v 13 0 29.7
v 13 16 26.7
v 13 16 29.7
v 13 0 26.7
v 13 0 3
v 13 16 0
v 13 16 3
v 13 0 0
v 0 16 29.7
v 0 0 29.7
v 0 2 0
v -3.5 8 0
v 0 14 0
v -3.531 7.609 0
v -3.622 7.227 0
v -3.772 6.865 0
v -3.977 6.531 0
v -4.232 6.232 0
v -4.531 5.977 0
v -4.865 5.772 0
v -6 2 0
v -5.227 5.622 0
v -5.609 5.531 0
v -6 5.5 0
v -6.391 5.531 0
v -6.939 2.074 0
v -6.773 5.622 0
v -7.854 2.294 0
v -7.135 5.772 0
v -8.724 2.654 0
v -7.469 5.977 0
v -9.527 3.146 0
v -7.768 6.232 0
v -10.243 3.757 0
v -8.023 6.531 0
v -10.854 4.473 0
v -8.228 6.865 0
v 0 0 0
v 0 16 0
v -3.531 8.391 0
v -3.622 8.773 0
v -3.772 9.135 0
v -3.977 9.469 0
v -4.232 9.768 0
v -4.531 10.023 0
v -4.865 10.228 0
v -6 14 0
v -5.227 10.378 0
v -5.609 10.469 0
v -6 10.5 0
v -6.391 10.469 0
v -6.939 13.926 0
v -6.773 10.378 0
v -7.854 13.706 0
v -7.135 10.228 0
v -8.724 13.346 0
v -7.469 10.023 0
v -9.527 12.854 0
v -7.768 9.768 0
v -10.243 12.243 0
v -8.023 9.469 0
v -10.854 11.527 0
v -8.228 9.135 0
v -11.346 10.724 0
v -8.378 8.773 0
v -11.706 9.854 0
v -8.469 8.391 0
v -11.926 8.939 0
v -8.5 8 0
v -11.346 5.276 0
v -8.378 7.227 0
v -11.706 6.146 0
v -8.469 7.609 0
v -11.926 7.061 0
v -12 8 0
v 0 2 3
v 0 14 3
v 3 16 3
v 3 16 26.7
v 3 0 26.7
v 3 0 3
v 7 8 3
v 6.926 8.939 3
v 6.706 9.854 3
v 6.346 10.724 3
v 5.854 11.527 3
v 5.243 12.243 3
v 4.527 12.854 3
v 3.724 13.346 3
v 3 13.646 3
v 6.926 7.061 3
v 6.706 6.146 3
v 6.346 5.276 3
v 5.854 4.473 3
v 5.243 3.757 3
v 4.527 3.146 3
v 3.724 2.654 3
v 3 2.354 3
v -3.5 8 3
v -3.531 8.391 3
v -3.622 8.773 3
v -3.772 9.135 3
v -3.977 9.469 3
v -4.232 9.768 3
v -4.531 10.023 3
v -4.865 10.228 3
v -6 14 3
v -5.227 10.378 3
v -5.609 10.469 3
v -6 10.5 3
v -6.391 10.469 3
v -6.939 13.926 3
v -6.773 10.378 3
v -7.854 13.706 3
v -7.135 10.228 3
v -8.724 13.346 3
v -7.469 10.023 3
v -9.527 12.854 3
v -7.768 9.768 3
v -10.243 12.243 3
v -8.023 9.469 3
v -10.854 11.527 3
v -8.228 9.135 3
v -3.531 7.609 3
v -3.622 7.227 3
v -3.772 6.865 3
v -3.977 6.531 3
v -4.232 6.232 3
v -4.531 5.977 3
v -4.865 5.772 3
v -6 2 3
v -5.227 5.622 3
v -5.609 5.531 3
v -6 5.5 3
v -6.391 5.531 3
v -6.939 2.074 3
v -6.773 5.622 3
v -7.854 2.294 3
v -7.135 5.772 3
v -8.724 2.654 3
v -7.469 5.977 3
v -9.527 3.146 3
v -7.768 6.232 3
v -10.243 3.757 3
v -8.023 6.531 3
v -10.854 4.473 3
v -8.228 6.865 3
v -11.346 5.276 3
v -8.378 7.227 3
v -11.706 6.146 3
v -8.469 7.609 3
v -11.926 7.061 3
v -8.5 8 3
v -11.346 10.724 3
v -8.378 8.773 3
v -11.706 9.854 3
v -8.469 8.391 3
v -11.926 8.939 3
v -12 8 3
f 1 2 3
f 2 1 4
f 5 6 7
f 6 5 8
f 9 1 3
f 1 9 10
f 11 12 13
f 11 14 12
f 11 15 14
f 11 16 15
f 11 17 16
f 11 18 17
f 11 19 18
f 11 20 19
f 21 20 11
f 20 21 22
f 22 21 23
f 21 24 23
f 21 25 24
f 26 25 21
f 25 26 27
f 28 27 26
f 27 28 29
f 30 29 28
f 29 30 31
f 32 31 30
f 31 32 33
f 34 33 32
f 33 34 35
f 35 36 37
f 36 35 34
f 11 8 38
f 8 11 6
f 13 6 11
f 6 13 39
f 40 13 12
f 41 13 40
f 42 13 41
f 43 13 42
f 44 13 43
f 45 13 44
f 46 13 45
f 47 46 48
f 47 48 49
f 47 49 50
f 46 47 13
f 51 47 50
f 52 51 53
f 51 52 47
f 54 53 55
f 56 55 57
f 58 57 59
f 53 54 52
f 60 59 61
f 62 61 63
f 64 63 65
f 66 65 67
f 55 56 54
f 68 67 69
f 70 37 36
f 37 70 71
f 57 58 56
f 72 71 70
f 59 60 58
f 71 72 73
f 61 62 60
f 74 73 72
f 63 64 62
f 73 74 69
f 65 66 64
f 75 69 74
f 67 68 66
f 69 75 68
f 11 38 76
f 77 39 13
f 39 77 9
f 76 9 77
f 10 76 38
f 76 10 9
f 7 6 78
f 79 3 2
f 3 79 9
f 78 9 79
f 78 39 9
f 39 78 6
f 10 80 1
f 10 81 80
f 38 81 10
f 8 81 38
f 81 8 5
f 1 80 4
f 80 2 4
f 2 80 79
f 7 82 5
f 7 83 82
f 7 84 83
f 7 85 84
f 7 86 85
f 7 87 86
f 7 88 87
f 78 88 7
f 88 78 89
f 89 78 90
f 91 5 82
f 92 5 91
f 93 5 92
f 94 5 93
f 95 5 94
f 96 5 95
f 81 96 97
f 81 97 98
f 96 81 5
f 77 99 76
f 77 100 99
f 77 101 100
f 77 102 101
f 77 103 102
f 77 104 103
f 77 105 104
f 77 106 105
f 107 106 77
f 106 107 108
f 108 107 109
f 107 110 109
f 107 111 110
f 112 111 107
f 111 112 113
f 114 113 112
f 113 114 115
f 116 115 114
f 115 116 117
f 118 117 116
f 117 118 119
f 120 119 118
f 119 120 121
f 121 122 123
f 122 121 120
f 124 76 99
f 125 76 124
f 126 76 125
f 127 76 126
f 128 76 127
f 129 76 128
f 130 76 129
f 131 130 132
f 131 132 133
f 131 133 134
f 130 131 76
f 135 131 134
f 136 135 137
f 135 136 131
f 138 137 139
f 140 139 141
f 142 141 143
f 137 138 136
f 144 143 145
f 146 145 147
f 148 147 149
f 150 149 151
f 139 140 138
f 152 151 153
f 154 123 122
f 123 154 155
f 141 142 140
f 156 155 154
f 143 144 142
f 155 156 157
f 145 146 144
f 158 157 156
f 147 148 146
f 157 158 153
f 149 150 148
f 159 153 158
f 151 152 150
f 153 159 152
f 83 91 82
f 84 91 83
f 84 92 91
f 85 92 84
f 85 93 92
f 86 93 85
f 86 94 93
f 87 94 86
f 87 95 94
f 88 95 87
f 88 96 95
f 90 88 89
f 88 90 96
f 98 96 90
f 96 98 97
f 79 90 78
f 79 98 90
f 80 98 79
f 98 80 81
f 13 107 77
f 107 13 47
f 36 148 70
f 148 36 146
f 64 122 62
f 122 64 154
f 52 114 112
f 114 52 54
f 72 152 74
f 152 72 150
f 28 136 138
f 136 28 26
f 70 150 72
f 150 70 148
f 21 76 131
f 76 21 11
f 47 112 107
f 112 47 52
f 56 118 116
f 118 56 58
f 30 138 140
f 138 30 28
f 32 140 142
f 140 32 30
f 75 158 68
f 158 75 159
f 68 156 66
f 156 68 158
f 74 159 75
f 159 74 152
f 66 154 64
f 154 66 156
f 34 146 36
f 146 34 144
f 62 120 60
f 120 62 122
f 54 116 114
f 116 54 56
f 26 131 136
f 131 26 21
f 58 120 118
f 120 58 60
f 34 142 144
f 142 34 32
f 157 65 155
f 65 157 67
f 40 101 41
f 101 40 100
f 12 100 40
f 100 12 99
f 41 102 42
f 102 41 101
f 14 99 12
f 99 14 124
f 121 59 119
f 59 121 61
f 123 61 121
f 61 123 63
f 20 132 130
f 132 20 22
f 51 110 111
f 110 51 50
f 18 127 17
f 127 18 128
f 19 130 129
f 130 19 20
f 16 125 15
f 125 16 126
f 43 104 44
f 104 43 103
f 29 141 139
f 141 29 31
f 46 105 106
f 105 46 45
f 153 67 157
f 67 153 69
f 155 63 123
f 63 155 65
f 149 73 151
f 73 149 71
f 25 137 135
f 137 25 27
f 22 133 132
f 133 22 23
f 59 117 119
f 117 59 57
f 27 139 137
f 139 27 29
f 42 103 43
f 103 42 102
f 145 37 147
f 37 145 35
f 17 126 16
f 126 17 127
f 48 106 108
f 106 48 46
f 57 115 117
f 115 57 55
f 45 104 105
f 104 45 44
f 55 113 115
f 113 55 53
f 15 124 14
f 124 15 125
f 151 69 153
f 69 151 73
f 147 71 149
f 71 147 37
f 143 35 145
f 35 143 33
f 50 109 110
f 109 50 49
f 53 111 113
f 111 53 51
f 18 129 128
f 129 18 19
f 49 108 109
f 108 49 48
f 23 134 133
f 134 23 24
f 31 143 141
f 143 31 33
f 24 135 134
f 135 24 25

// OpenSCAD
// file: ../case/case_dimensions.scad
// Shared Piblo case dimensions, in mm; sources/estimates: DIMENSIONS.md.
dev_L = 84.0;
dev_W = 54.0;
dev_T_block = 19.6;
clr = 0.30;
clr_z = 0.30;
wall = 2.4;
floor_t = 1.8;
plate_t = 1.5;
// main file
// Piblo removable case-edge clip with lanyard/keyring eye. UNTESTED.
// Print with supports under the upper jaw. Check grip before attaching Piblo.
include <../case/case_dimensions.scad>
hole_d = 5;
gap = dev_T_block + clr_z + plate_t + floor_t + 0.5;
eye_d = max(3, min(8, hole_d));
$fn = 40;
union() {
    difference() {
        cube([13, 16, gap+6]);
        translate([3, -0.1, 3]) cube([10.1, 16.2, gap]);
    }
    difference() {
        hull() {
            translate([-6,8,0]) cylinder(d=eye_d+7, h=3);
            translate([1,8,0]) cylinder(d=eye_d+7, h=3);
        }
        translate([-6,8,-0.1]) cylinder(d=eye_d, h=3.2);
    }
}
